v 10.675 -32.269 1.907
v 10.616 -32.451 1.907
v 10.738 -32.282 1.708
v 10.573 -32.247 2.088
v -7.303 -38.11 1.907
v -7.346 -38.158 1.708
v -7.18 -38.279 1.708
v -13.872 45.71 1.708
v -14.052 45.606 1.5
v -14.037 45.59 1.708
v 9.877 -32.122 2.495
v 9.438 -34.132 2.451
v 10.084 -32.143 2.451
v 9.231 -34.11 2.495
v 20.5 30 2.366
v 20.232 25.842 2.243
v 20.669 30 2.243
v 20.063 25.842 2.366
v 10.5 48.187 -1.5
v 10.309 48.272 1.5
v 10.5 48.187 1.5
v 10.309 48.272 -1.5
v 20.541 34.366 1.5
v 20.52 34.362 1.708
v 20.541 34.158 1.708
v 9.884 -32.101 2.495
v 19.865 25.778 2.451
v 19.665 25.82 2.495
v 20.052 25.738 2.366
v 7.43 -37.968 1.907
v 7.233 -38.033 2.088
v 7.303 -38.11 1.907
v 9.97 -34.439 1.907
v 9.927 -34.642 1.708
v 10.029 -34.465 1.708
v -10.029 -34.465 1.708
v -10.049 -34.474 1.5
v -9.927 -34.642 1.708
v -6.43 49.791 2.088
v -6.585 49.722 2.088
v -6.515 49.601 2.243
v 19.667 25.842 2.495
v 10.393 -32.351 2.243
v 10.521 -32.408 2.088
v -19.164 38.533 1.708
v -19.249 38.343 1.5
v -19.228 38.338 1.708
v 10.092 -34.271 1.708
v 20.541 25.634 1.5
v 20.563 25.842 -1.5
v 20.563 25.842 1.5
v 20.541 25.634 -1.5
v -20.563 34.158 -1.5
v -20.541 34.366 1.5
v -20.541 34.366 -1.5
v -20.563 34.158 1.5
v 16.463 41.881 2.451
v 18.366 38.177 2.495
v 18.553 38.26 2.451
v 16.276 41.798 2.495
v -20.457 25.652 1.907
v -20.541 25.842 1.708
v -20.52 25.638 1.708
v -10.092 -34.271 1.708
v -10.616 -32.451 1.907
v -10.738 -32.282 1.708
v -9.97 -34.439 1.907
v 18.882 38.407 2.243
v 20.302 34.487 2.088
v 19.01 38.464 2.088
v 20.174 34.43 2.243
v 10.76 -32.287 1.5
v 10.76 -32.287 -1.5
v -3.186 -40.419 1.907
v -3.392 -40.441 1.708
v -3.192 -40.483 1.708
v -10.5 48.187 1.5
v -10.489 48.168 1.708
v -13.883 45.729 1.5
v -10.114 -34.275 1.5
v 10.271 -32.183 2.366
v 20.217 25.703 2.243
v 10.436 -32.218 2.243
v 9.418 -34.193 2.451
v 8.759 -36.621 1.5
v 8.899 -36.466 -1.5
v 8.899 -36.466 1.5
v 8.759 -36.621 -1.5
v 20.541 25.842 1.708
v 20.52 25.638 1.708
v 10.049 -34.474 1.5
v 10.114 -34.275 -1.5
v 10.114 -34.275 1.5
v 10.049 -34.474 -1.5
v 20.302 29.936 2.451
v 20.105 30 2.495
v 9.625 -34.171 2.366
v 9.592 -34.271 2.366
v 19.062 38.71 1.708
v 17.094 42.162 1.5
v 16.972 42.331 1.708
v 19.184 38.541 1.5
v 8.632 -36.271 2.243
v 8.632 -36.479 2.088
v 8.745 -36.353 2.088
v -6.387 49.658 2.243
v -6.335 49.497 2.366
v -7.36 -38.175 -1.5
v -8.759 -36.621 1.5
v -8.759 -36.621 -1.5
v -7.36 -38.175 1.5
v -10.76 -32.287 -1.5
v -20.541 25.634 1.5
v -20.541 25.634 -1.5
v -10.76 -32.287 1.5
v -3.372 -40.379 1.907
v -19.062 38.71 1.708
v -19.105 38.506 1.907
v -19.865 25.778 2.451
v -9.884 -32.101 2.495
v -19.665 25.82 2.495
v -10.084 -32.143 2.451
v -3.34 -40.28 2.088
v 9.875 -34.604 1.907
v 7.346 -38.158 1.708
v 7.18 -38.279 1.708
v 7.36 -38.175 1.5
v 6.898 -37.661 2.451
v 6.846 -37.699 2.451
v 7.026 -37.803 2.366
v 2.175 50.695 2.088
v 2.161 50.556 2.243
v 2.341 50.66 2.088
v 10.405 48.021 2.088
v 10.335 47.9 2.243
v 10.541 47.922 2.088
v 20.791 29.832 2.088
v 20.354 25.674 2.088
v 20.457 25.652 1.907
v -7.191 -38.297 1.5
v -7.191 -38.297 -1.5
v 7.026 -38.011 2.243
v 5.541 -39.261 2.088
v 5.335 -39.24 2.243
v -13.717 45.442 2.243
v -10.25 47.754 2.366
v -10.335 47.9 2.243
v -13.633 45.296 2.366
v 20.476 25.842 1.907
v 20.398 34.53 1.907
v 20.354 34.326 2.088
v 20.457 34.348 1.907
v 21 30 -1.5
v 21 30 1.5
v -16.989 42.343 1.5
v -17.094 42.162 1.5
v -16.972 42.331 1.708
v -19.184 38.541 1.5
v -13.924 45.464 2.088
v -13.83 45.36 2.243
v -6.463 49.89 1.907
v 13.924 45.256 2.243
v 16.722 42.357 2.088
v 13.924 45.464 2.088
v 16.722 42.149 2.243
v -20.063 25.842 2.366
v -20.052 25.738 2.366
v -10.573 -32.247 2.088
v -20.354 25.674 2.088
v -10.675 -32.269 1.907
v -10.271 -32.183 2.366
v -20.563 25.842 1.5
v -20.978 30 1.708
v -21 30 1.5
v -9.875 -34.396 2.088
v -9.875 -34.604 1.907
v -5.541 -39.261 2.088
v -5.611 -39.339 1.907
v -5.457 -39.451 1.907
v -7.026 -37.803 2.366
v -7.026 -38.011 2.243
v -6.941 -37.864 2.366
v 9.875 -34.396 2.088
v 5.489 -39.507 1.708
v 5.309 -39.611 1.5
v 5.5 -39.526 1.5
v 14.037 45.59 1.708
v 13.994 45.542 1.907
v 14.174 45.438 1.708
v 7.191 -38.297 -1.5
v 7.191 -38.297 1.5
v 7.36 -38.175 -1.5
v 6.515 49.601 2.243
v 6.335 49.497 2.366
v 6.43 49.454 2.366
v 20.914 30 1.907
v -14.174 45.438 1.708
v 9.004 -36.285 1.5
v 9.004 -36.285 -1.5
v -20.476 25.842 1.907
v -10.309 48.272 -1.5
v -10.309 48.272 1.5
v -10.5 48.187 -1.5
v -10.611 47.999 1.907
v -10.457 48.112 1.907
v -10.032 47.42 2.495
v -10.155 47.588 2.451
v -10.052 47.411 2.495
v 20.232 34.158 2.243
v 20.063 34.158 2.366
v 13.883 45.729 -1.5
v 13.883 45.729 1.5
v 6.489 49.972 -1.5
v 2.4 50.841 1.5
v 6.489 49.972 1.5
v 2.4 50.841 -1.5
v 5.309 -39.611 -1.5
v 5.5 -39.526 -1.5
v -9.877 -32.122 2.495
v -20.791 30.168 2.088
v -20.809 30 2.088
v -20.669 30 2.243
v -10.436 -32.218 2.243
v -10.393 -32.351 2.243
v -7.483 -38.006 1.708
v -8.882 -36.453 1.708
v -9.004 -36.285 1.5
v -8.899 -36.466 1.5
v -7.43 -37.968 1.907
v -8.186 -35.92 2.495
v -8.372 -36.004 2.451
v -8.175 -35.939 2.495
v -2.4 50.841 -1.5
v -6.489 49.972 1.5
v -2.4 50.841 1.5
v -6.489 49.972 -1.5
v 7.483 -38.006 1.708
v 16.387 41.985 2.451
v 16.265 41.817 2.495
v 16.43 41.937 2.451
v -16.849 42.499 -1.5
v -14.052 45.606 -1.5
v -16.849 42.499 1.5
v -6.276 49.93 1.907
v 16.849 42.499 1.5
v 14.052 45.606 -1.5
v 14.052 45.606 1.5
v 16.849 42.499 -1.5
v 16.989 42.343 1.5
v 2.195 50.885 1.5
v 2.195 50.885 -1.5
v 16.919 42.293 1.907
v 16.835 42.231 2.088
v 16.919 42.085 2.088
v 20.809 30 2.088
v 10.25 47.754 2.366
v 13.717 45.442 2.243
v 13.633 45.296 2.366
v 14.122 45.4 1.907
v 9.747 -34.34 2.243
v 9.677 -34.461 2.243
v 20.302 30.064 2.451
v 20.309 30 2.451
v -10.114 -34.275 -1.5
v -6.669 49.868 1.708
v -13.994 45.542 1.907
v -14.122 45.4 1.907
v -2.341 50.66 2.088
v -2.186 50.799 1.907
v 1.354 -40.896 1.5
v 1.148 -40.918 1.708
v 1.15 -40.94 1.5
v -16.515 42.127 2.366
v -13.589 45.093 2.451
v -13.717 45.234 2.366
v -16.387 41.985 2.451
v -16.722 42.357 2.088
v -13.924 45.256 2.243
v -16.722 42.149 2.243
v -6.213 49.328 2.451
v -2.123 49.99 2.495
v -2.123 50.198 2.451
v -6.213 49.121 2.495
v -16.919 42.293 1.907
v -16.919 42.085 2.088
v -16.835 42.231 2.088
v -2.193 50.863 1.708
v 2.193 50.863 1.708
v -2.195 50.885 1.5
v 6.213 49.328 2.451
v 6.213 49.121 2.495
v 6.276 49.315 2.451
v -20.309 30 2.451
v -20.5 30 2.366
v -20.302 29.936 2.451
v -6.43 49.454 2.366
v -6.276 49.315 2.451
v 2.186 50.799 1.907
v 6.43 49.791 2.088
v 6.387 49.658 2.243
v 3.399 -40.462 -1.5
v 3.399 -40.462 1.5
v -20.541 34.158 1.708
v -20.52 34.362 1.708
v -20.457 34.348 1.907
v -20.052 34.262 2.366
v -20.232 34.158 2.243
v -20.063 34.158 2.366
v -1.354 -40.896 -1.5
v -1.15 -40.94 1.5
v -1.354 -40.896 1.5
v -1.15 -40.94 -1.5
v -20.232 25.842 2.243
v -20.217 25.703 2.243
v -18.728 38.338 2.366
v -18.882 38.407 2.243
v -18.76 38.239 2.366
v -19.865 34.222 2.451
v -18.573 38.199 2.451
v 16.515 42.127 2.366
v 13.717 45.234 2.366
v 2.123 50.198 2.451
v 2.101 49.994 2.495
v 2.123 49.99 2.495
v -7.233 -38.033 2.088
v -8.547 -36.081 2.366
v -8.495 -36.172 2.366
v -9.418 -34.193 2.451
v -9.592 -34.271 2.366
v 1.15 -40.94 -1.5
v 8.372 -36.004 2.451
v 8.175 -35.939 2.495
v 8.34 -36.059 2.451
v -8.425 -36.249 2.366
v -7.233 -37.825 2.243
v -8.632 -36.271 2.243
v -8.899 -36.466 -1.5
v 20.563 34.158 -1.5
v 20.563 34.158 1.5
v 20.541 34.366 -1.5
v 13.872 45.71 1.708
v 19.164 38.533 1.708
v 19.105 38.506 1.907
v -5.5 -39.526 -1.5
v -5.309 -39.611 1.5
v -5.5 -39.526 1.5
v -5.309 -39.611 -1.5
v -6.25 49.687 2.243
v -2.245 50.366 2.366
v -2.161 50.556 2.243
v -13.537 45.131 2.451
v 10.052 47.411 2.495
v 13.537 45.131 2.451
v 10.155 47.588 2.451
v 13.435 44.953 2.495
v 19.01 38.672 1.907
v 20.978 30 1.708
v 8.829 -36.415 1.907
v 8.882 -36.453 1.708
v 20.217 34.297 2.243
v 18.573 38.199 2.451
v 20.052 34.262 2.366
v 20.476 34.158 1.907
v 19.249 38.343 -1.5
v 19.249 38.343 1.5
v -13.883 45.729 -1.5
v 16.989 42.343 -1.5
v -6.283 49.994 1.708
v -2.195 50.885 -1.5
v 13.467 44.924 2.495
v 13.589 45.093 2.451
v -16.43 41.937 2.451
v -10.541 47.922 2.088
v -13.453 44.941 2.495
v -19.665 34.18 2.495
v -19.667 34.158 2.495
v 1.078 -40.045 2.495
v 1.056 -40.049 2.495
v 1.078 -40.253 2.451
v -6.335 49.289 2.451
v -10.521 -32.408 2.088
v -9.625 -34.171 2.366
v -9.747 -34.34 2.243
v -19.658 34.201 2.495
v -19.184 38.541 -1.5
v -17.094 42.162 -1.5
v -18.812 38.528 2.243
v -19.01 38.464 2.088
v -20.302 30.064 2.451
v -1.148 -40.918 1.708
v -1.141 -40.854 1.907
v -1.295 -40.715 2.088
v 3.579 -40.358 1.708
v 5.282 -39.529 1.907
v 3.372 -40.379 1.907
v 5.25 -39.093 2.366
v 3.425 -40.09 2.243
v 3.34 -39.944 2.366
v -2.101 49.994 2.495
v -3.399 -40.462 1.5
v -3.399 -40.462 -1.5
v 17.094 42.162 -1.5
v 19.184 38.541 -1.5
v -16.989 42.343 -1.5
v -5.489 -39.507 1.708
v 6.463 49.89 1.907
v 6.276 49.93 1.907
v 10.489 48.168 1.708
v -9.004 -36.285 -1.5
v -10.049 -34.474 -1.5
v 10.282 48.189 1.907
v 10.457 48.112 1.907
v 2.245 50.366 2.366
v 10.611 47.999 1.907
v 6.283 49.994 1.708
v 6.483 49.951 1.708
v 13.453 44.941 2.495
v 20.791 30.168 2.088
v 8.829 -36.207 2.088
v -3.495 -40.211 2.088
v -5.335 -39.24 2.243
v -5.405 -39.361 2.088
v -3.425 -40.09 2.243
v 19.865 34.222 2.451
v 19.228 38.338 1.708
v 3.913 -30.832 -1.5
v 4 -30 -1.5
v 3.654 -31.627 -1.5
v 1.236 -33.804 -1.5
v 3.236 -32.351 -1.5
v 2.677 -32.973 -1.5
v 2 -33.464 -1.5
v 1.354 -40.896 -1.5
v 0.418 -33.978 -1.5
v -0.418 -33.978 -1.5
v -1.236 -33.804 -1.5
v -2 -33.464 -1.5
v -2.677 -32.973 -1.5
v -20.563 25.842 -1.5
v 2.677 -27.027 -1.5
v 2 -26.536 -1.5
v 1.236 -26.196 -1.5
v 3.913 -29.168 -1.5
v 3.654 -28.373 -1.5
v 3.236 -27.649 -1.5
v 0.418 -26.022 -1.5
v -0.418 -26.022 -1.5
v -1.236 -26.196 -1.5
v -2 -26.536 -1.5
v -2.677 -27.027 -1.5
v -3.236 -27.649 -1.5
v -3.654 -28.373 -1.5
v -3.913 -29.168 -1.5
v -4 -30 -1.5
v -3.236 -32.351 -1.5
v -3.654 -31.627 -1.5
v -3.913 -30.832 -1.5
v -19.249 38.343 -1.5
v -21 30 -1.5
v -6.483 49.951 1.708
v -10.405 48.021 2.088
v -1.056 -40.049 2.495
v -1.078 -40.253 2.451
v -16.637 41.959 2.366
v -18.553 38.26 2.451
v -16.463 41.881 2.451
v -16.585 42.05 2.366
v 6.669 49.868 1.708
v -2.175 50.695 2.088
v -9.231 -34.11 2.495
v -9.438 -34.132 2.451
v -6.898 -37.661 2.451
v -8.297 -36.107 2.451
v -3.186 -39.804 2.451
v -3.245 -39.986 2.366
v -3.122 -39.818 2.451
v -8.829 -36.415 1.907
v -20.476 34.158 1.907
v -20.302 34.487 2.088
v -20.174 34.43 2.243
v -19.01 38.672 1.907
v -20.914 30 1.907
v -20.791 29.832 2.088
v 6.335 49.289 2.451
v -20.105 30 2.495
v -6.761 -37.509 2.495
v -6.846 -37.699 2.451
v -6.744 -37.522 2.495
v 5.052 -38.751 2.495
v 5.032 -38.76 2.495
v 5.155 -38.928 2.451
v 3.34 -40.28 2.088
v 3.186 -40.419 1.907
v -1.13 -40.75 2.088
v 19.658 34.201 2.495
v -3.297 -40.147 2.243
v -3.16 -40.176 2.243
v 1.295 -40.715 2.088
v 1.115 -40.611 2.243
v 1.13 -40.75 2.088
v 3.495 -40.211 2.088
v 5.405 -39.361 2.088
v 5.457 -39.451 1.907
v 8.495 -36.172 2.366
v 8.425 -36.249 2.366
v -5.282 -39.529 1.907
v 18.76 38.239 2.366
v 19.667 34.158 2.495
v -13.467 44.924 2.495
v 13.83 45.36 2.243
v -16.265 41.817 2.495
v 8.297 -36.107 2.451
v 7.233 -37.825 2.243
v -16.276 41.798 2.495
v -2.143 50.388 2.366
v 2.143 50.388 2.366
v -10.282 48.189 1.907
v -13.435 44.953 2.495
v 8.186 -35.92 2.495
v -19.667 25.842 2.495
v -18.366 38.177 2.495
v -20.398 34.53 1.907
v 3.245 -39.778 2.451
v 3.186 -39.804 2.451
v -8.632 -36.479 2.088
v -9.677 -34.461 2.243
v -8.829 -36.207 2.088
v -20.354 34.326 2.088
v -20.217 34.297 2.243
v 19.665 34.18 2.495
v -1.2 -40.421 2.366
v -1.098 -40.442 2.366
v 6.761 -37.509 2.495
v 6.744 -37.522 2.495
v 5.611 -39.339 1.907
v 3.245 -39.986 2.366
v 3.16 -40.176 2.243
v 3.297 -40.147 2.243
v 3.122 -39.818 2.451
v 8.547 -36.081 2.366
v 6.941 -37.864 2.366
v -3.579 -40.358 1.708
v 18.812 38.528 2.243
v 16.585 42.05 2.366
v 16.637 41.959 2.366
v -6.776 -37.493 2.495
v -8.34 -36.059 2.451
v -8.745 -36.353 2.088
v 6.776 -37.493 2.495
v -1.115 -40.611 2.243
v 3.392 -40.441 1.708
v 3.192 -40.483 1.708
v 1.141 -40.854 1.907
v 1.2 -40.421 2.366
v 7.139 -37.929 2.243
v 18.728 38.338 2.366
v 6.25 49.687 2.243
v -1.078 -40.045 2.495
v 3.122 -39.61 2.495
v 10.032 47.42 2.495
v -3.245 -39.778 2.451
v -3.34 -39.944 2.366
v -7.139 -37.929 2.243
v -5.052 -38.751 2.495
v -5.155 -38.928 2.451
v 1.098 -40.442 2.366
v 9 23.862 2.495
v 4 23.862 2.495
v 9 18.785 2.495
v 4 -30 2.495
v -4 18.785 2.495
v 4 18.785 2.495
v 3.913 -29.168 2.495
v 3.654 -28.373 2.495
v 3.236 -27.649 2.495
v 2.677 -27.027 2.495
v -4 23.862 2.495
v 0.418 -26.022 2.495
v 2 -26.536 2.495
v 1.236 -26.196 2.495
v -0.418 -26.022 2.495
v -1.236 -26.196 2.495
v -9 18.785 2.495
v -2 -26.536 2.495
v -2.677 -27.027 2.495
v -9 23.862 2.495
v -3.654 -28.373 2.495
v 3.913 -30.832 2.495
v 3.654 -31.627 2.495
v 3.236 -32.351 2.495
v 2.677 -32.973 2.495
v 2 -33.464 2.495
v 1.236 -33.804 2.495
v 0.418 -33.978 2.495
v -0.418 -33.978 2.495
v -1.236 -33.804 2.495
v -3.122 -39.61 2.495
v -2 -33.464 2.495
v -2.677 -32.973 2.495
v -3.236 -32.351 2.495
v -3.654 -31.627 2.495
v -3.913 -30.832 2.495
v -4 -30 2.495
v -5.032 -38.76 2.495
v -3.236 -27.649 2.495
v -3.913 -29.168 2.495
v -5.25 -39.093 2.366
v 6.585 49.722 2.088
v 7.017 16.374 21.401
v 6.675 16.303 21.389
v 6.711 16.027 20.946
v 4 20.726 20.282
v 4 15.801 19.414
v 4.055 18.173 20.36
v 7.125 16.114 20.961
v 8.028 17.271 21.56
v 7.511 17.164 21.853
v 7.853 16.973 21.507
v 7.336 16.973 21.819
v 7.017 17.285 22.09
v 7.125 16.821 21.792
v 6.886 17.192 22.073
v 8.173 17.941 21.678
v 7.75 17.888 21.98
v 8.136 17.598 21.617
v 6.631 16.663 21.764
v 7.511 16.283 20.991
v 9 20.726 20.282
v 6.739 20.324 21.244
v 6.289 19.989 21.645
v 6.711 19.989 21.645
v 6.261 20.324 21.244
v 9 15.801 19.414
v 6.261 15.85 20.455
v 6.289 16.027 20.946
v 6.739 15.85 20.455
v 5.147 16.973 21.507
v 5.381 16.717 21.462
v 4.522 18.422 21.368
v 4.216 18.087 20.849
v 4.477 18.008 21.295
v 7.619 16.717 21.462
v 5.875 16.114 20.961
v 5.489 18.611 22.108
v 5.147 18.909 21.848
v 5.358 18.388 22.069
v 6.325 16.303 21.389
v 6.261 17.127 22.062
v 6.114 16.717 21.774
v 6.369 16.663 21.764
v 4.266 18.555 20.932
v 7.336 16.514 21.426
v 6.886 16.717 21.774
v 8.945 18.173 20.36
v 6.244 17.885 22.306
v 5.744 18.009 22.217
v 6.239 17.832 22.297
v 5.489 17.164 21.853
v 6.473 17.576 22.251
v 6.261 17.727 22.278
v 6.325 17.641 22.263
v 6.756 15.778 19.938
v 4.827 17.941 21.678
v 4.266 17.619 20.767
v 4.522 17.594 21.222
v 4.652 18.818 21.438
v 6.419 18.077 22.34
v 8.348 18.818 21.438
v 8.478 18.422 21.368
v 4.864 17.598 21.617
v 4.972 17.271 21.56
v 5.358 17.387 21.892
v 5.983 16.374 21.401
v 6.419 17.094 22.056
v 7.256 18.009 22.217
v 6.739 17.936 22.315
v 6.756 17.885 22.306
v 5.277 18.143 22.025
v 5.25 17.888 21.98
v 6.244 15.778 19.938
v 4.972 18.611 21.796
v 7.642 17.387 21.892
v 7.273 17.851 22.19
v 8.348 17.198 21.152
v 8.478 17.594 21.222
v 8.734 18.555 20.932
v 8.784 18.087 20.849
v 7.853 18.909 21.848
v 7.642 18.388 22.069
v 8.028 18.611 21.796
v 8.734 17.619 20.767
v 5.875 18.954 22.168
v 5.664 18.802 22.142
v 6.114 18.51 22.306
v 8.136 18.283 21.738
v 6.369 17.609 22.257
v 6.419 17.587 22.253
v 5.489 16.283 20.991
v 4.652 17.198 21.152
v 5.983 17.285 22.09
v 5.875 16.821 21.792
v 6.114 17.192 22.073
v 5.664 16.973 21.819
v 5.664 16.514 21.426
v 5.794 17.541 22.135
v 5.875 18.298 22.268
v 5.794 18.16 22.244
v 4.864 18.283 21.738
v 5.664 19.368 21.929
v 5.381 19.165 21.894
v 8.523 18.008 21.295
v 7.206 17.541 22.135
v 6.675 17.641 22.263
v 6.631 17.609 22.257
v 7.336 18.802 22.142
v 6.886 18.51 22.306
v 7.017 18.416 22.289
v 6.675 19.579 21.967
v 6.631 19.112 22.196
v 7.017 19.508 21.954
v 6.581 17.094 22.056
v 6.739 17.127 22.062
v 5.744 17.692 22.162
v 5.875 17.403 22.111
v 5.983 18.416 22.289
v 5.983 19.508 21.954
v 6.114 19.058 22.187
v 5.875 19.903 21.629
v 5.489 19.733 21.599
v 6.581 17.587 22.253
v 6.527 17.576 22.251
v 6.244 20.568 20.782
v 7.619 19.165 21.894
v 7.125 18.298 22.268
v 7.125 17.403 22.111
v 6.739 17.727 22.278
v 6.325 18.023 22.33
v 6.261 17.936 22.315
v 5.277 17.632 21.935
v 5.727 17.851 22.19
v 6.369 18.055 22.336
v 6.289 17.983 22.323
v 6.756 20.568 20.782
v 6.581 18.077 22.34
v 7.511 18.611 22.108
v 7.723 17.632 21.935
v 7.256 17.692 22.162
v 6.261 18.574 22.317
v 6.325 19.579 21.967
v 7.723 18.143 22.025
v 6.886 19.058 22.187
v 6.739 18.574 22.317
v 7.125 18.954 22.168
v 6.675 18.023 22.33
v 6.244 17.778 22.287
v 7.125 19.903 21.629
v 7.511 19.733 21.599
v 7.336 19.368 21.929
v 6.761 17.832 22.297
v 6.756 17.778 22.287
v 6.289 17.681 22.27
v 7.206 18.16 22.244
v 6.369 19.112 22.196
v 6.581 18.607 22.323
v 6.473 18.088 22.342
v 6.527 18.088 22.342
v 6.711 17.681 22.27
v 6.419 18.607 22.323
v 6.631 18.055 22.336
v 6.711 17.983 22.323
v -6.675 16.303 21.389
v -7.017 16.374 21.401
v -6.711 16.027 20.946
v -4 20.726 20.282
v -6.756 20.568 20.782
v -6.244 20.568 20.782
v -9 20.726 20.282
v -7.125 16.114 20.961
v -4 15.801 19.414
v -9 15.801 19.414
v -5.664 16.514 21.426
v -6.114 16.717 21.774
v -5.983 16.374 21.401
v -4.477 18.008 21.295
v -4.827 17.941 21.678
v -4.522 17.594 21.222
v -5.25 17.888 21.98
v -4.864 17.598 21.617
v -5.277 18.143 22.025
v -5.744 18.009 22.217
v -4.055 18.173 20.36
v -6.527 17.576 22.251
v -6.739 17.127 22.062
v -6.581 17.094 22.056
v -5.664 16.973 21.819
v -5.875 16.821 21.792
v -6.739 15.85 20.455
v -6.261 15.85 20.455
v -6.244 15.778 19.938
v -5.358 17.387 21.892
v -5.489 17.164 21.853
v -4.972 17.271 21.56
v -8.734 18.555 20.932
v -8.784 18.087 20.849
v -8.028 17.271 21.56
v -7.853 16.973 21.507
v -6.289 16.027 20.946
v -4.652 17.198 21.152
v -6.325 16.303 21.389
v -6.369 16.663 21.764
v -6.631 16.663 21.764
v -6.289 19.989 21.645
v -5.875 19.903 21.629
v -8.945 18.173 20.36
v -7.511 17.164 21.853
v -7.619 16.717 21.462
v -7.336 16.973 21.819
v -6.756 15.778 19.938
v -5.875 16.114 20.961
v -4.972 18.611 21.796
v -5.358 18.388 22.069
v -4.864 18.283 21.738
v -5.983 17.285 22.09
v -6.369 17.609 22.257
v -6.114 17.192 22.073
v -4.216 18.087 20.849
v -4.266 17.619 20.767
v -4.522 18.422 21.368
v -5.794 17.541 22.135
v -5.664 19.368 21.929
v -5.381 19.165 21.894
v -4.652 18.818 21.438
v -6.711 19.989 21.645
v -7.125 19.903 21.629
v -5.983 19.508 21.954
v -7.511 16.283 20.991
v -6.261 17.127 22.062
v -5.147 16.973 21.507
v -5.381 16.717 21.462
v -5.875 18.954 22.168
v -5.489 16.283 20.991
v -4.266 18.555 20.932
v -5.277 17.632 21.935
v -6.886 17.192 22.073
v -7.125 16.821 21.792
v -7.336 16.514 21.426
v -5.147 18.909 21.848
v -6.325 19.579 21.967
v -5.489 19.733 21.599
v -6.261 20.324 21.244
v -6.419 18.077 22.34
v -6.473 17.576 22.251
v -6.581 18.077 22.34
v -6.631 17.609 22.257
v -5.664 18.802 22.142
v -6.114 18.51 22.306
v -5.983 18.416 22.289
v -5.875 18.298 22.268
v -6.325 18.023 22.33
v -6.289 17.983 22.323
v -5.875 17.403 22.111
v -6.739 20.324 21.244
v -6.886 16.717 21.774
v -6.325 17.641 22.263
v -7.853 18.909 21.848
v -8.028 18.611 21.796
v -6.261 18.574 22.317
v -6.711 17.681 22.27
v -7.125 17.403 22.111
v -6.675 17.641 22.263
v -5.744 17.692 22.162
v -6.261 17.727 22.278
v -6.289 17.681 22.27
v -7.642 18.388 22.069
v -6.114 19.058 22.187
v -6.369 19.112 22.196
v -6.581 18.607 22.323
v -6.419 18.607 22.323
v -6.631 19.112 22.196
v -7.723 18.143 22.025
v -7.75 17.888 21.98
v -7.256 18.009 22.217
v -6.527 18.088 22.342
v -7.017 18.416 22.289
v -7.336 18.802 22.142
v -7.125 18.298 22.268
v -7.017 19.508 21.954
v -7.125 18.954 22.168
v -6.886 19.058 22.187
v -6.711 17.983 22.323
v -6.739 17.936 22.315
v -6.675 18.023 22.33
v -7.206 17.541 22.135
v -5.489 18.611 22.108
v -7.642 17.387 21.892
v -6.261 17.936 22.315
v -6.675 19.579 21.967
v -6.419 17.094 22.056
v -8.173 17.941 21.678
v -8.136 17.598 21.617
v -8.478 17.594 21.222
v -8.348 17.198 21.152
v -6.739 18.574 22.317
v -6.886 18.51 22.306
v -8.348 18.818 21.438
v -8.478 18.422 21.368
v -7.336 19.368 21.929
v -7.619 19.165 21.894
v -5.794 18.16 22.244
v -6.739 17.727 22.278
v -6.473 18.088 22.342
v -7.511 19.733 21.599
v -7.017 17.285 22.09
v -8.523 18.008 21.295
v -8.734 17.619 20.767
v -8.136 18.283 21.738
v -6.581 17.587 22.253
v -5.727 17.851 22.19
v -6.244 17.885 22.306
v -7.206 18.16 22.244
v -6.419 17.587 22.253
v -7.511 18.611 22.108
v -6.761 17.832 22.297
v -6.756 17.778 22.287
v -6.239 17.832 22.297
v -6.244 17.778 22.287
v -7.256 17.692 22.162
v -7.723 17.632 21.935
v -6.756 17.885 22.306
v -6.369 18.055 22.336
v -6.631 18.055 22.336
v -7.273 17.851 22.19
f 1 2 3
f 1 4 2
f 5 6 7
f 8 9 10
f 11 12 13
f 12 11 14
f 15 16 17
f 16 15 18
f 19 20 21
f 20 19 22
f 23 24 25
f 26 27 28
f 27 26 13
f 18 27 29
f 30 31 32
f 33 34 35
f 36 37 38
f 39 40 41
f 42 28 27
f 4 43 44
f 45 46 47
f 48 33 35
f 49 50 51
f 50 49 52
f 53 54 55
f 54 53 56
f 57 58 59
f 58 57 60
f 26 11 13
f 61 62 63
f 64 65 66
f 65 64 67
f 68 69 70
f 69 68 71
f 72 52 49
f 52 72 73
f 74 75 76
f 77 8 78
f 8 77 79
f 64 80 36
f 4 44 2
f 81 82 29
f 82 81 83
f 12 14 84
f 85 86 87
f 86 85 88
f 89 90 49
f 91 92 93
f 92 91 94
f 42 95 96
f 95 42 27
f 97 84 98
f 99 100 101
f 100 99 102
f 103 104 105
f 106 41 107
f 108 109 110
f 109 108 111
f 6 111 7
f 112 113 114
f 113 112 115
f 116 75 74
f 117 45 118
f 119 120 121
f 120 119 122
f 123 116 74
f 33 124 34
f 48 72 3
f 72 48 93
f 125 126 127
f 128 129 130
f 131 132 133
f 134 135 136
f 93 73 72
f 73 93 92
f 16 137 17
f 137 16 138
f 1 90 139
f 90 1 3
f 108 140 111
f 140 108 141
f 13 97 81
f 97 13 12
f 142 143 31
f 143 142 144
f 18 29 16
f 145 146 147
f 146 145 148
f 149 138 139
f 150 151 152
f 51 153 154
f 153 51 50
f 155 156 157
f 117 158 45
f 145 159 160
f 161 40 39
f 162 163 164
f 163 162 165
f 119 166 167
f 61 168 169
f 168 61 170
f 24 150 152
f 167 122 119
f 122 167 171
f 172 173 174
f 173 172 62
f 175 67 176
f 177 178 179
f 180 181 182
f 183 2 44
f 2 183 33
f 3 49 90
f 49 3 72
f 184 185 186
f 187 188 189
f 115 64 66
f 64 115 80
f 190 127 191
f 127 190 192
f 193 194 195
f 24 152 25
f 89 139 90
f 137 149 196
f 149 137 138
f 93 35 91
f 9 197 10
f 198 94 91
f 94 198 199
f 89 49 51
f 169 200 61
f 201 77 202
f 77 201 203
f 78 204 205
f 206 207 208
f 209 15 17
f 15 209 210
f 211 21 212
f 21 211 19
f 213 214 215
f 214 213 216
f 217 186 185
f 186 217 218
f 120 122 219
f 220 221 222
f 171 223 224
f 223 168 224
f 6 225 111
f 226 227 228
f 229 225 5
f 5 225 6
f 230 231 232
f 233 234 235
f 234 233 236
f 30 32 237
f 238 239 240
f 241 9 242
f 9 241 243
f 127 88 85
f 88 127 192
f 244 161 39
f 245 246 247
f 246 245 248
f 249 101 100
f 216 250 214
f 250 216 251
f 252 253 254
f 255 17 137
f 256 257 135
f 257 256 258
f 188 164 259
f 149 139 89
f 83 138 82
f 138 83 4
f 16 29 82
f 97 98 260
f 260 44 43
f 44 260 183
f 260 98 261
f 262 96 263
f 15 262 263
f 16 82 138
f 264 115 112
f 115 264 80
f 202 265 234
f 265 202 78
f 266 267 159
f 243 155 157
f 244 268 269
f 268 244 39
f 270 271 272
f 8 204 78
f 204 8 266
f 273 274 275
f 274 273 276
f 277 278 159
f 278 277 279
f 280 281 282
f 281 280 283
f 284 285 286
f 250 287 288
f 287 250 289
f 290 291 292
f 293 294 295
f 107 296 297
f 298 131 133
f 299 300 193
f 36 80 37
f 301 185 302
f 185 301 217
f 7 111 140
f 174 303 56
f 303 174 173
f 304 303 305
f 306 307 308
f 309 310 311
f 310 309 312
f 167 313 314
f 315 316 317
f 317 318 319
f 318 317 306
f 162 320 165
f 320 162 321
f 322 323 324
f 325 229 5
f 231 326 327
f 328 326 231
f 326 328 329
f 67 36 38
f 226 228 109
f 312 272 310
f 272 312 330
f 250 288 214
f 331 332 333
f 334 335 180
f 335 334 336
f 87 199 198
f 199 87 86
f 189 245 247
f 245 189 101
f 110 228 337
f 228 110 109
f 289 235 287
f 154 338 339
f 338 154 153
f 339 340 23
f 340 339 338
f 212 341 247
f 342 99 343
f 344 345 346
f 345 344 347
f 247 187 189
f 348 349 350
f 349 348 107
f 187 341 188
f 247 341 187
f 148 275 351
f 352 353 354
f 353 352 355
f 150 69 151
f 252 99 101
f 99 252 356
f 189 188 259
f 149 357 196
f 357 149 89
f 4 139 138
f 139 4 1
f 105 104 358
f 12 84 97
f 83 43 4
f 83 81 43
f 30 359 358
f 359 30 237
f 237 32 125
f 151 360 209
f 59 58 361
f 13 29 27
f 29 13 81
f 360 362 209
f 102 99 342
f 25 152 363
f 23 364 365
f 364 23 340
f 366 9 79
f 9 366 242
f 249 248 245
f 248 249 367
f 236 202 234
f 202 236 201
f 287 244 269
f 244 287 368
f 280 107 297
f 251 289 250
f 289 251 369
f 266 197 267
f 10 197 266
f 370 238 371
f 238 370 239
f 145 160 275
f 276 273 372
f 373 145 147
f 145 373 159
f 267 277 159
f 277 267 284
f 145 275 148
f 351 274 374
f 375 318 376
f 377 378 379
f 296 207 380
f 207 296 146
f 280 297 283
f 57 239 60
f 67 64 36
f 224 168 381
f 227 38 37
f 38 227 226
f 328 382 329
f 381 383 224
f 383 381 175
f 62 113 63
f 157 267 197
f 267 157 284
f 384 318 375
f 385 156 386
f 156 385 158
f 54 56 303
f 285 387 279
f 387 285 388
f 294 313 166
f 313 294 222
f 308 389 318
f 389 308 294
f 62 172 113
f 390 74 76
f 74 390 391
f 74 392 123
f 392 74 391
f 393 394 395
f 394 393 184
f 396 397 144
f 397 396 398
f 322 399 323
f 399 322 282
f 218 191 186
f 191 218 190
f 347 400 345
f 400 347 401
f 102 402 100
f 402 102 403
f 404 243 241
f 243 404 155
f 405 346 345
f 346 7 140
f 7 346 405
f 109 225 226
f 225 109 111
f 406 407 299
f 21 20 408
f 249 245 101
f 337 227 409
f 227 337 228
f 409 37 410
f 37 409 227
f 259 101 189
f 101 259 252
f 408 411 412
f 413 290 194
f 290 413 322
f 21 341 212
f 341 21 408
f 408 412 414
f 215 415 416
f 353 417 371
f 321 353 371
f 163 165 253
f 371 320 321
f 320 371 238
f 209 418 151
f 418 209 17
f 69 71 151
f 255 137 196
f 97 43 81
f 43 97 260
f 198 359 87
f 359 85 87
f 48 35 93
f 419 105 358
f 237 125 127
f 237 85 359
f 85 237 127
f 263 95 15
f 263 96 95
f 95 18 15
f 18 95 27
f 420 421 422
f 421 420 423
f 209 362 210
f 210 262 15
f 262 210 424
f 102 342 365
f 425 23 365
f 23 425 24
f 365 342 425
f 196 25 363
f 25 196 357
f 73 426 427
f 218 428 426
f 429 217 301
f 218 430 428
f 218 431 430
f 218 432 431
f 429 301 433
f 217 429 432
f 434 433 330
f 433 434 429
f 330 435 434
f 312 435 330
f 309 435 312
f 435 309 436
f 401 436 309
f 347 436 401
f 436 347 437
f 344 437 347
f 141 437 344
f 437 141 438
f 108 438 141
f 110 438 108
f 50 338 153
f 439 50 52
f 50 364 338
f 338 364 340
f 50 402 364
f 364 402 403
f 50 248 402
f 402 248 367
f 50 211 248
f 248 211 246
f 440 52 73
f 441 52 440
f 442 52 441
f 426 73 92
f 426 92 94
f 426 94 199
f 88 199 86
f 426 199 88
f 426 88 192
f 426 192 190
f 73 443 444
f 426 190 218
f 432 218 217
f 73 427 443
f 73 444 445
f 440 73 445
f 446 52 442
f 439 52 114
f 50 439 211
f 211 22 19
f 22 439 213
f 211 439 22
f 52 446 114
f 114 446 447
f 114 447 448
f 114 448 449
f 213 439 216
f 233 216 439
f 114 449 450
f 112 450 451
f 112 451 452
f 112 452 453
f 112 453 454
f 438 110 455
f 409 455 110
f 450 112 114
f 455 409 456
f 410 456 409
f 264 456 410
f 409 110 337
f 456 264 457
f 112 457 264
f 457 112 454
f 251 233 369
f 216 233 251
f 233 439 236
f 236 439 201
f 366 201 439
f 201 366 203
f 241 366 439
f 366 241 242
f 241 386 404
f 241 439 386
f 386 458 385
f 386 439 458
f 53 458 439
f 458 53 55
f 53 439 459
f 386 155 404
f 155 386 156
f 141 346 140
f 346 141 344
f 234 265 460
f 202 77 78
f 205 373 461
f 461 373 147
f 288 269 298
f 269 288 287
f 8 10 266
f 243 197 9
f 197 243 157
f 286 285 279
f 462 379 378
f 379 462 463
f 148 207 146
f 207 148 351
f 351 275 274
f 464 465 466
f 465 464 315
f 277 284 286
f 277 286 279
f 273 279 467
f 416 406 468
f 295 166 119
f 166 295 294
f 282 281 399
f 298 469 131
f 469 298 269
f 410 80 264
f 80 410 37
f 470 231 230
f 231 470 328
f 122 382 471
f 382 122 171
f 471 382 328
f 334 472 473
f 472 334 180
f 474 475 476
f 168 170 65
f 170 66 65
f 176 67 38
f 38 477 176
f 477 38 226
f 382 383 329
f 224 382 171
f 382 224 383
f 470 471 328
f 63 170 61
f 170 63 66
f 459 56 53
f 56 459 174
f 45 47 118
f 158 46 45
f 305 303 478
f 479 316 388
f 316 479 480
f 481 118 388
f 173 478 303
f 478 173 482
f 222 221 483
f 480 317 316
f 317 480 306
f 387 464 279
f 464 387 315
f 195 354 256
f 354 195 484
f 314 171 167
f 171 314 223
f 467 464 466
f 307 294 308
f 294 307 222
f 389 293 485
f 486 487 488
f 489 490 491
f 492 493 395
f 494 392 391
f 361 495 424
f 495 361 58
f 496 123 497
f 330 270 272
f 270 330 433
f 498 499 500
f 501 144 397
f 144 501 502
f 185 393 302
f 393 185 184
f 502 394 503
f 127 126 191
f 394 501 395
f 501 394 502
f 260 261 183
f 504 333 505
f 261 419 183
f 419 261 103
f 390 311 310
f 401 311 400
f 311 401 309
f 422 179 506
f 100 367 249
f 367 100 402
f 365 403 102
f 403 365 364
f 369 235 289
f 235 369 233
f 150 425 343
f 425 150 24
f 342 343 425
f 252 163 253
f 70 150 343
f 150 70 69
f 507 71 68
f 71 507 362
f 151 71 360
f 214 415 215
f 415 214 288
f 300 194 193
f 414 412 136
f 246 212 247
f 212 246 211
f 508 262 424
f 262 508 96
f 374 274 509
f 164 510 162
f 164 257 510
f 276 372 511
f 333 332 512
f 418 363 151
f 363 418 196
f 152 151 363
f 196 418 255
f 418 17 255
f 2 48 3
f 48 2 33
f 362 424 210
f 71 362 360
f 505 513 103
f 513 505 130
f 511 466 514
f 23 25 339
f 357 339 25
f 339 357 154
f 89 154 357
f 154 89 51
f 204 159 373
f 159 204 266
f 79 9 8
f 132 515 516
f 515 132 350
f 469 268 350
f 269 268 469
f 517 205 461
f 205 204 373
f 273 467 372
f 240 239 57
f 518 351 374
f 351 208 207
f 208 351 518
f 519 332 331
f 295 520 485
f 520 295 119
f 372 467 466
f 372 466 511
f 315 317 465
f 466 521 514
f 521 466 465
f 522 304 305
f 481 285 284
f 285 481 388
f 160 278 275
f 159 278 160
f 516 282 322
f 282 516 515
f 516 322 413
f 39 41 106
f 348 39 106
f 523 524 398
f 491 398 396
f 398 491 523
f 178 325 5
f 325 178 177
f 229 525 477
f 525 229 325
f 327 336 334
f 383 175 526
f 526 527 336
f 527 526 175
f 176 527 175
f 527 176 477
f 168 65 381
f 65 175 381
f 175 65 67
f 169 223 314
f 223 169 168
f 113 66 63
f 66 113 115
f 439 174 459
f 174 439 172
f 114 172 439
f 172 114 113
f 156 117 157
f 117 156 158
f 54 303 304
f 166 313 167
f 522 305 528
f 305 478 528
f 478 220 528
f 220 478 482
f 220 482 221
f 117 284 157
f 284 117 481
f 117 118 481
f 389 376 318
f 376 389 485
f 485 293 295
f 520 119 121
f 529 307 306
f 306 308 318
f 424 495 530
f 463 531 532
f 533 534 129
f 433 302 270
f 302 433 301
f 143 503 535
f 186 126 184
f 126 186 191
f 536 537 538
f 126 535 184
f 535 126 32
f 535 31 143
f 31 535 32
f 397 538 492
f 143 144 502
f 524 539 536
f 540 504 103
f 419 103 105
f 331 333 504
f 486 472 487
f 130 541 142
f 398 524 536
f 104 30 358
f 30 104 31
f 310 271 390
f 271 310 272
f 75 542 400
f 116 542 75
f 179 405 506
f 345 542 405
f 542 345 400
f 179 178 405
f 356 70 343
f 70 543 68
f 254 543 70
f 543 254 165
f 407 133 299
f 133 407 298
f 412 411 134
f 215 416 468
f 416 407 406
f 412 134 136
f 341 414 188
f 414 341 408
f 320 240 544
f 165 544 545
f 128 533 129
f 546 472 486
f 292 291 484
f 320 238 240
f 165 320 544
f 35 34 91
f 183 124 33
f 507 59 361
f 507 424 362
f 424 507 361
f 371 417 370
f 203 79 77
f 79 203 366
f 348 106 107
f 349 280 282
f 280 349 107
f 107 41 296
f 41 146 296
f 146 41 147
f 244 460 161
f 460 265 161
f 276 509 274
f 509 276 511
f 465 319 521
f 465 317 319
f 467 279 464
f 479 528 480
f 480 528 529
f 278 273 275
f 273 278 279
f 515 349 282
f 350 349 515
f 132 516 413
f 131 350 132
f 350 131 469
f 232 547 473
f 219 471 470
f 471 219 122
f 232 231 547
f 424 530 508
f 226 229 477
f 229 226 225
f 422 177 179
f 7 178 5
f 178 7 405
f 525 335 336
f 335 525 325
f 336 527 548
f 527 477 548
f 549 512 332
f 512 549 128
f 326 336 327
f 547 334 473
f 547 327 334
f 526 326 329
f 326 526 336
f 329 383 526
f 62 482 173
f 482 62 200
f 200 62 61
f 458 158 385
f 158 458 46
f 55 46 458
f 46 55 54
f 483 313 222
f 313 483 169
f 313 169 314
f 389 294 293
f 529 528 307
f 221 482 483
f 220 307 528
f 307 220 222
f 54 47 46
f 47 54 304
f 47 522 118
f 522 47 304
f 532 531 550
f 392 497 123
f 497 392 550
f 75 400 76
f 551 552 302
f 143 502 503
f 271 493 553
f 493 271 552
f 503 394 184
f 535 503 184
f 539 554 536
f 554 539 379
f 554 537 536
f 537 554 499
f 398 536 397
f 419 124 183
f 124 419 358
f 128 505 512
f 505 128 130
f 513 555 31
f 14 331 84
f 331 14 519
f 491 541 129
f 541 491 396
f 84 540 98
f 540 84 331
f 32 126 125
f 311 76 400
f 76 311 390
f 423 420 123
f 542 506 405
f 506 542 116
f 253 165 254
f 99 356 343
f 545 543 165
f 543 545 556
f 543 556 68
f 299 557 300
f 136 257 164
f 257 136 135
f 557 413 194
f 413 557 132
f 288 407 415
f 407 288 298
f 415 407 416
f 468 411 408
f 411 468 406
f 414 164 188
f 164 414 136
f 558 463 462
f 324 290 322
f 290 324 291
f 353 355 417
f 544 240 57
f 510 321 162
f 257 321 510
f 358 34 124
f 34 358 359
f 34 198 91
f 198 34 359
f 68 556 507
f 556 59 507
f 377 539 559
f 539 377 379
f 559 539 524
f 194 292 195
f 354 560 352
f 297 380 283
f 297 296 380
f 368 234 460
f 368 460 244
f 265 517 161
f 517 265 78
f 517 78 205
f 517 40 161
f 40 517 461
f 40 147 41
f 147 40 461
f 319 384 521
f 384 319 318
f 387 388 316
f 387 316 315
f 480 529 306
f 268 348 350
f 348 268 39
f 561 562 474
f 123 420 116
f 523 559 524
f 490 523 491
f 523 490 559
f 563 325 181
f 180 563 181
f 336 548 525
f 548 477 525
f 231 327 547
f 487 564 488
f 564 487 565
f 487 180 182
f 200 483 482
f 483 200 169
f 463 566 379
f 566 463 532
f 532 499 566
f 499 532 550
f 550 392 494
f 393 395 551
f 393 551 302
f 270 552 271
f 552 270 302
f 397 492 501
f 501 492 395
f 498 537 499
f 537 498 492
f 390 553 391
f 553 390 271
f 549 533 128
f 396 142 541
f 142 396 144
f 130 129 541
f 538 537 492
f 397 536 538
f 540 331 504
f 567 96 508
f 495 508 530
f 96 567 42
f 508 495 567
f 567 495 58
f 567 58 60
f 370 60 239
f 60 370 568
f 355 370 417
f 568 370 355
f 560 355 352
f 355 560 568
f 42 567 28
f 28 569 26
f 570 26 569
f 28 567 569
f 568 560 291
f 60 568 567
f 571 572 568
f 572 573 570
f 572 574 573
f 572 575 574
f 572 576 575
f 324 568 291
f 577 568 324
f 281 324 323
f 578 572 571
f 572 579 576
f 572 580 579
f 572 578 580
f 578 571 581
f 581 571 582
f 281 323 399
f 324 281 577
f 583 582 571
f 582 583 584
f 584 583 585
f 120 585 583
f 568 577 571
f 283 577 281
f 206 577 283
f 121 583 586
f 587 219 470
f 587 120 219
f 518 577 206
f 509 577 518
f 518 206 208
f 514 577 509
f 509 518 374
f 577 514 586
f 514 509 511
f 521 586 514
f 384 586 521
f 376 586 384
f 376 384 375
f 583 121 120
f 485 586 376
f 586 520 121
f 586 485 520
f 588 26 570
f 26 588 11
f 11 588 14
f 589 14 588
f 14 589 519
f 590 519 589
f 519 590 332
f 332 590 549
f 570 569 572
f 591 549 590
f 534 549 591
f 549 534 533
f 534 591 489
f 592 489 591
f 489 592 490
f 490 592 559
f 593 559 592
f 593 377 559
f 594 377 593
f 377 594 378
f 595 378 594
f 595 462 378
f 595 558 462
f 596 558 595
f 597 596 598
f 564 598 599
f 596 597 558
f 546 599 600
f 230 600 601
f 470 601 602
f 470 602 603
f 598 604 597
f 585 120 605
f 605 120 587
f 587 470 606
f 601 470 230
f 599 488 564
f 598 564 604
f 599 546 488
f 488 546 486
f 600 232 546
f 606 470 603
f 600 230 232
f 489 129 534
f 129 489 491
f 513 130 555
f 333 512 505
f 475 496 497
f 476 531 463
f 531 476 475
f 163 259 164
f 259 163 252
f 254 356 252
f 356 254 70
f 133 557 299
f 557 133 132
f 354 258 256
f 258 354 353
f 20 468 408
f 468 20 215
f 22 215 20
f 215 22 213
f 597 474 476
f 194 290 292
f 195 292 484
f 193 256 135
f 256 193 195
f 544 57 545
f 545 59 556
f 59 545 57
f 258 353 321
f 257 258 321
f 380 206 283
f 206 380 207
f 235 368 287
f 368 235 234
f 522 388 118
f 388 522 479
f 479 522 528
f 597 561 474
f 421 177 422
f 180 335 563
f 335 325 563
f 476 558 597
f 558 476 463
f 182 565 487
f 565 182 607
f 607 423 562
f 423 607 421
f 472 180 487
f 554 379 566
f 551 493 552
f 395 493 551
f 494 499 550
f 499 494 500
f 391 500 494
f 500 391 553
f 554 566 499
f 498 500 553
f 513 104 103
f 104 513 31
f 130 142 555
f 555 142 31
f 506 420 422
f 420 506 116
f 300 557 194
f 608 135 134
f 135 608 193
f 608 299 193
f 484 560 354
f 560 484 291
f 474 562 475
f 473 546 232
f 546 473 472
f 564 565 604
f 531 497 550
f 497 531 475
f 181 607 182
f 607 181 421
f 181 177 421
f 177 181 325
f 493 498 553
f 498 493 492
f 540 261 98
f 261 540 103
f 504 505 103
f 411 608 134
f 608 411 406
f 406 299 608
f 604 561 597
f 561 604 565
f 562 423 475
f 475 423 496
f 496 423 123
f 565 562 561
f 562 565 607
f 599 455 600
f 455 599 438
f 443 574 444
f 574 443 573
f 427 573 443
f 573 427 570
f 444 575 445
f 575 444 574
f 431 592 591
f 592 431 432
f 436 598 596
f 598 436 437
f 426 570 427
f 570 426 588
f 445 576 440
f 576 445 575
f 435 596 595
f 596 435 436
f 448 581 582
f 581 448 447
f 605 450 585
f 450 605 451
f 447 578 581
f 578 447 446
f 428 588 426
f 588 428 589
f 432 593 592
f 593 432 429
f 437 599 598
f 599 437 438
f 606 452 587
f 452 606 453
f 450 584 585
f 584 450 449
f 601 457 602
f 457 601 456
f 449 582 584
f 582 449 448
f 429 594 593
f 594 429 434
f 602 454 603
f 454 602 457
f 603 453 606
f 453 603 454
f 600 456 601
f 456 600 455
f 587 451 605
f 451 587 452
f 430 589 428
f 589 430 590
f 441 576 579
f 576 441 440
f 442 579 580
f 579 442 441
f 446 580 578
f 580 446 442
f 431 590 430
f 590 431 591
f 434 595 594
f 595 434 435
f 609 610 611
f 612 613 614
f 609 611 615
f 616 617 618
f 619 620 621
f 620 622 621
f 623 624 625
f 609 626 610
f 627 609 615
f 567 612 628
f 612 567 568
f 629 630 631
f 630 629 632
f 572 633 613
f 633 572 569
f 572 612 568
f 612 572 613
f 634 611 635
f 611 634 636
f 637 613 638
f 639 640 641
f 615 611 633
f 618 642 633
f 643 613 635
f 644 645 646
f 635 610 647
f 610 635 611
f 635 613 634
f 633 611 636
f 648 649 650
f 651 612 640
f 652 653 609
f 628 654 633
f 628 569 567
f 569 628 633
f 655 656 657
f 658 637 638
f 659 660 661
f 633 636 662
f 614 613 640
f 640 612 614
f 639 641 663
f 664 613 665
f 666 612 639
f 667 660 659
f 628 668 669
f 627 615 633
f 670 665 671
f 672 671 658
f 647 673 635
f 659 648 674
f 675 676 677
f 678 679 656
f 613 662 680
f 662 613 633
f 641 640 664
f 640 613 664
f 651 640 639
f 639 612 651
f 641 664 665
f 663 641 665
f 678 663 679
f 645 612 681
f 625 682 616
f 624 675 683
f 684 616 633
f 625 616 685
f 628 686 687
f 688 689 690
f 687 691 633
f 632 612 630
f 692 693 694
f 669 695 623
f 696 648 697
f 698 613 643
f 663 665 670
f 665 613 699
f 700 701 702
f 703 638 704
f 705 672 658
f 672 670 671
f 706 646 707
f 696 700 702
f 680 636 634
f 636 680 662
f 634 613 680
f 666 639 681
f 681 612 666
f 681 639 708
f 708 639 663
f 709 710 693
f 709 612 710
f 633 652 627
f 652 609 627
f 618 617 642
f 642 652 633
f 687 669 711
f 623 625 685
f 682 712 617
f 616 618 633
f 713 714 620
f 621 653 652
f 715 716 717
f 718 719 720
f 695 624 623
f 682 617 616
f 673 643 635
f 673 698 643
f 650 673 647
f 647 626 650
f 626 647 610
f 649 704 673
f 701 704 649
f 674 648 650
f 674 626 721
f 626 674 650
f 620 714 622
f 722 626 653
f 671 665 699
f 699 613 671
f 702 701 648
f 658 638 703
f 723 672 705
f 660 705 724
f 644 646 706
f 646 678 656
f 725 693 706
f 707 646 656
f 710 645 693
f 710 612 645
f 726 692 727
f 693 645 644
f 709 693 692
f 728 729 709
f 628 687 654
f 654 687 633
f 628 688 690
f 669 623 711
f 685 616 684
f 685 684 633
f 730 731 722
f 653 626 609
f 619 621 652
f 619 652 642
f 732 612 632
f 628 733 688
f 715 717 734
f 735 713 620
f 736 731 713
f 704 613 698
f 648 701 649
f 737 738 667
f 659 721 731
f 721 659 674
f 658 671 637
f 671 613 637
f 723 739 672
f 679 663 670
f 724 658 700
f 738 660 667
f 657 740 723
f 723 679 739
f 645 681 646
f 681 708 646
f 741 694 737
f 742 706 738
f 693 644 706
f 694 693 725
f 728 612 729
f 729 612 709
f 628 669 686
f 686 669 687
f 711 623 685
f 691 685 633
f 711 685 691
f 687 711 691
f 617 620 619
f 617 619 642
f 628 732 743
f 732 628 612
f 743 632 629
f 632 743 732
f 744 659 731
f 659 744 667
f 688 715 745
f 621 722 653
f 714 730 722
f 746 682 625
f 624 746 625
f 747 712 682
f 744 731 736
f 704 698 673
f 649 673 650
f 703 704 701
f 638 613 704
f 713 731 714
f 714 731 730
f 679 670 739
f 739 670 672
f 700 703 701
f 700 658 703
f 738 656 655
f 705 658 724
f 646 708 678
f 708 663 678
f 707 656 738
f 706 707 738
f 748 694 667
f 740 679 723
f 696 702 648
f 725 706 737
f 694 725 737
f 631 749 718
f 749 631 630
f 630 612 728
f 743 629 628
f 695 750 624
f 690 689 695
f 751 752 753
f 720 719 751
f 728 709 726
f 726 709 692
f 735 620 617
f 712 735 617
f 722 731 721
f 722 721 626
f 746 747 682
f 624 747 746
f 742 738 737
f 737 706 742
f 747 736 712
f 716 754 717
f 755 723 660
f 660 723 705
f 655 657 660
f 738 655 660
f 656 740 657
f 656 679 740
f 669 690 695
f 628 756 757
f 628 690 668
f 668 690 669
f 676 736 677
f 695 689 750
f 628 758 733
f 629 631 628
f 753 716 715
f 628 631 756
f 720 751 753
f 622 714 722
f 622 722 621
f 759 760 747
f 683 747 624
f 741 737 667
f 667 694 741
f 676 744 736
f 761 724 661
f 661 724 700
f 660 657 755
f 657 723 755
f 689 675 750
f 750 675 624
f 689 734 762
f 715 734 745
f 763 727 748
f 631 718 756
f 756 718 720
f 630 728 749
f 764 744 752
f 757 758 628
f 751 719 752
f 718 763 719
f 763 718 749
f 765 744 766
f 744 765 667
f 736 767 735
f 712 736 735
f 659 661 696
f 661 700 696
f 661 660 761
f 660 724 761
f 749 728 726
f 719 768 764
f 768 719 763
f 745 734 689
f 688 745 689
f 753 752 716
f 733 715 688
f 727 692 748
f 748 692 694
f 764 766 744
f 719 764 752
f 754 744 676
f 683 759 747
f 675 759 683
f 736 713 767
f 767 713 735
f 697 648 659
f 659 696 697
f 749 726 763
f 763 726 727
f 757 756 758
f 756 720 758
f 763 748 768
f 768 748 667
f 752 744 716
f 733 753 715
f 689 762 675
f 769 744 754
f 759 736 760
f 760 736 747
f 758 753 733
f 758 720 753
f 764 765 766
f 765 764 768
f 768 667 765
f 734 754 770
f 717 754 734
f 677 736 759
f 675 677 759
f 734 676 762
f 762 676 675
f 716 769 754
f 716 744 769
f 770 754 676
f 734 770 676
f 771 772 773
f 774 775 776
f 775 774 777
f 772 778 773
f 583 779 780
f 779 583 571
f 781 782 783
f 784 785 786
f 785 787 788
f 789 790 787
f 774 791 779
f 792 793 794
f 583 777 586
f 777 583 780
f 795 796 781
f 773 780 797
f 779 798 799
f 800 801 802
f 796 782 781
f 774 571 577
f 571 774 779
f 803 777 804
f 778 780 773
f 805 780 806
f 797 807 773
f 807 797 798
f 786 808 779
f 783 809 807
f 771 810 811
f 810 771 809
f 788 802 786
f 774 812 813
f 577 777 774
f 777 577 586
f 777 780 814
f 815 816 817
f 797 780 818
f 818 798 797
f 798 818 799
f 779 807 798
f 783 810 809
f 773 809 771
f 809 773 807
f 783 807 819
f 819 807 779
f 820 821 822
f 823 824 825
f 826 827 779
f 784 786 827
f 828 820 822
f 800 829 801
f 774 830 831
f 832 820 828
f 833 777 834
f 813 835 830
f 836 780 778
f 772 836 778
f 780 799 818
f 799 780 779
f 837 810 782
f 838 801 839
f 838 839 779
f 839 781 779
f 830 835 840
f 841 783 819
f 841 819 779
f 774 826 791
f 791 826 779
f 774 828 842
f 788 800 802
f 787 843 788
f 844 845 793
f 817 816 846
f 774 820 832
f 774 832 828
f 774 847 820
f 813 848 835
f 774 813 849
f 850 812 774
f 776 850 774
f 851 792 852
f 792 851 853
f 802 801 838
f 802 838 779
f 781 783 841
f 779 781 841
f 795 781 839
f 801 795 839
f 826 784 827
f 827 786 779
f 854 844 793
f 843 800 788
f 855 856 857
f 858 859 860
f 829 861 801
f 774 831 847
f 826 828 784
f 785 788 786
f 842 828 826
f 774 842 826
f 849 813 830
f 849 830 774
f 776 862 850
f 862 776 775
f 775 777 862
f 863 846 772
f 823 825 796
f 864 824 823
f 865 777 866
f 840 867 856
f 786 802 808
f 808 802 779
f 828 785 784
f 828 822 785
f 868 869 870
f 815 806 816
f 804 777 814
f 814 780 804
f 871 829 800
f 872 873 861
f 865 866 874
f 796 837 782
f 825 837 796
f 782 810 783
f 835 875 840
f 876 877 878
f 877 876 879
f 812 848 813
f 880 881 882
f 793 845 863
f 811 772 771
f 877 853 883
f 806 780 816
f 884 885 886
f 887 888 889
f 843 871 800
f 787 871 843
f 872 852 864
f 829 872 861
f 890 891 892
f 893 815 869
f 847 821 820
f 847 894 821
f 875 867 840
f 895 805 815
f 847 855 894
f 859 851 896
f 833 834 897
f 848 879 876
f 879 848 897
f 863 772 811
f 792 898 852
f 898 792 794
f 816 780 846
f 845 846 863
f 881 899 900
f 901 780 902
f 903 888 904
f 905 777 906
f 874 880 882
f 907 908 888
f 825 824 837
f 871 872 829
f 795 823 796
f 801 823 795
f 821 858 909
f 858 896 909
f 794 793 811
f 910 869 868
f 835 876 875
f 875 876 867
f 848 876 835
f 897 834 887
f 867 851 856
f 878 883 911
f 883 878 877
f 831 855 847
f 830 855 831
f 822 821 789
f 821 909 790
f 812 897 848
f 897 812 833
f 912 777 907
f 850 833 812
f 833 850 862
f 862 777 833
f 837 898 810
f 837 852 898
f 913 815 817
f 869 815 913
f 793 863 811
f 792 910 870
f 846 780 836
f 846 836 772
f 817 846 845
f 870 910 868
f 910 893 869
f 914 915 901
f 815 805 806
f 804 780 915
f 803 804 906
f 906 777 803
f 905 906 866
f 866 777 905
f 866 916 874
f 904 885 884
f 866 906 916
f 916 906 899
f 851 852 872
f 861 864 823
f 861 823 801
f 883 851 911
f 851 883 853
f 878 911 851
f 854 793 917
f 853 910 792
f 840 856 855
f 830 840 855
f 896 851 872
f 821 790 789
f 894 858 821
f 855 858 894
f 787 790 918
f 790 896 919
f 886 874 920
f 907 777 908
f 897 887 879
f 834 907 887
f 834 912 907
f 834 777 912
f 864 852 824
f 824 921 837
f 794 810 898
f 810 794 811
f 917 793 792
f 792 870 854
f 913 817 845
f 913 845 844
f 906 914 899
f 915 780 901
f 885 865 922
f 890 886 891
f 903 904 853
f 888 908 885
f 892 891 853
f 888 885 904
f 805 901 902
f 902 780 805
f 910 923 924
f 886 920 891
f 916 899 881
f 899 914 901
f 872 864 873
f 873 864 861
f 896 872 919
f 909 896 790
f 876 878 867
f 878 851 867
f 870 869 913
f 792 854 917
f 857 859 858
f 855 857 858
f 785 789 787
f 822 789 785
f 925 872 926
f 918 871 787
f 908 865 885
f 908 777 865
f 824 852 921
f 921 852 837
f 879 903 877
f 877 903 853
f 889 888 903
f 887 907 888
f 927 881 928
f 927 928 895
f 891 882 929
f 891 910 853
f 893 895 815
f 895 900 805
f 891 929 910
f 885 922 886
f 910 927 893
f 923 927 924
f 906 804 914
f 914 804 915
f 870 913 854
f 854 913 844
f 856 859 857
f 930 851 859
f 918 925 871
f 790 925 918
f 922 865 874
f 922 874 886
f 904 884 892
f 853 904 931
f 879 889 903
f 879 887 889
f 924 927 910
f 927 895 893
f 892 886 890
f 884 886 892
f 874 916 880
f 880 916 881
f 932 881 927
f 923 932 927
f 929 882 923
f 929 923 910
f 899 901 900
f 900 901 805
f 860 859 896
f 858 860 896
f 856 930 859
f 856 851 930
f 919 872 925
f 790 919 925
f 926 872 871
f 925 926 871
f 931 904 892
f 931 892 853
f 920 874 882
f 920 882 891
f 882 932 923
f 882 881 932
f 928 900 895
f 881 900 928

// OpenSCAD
$fn=30;

$len=60;
$top=20;
$bottom=40;
$toolspace=8;
$armwidth=5;

module arm(l, w, h) {
    rotate([10, 0, 0]) {
        hull() {
            cube([l, w, h], center=true);
            translate([0, 0, h/2]) sphere(d=l, center=true);
        }
    }
}

module arms(l, w, h) {
    translate([$armwidth/2+$toolspace/2, $top, 10]) arm(l, w, h);
    mirror() translate([$armwidth/2+$toolspace/2, $top, 10]) arm(l, w, h);
}

difference() {
    minkowski() {
        hull() {
            translate([0, -$len/2, 0]) cylinder(d=$top, h=3, center=true);
            translate([0, $len/2, 0]) cylinder(d=$bottom, h=3, center=true);
        }
        difference() {
            sphere(1, center=true);
            translate([0, 0, -1]) cube(2, center=true);
        }
    }
    translate([0, -$len/2, 0]) cylinder(d=8, h=5.1, center=true);
}

arms(5, 5, 20);
